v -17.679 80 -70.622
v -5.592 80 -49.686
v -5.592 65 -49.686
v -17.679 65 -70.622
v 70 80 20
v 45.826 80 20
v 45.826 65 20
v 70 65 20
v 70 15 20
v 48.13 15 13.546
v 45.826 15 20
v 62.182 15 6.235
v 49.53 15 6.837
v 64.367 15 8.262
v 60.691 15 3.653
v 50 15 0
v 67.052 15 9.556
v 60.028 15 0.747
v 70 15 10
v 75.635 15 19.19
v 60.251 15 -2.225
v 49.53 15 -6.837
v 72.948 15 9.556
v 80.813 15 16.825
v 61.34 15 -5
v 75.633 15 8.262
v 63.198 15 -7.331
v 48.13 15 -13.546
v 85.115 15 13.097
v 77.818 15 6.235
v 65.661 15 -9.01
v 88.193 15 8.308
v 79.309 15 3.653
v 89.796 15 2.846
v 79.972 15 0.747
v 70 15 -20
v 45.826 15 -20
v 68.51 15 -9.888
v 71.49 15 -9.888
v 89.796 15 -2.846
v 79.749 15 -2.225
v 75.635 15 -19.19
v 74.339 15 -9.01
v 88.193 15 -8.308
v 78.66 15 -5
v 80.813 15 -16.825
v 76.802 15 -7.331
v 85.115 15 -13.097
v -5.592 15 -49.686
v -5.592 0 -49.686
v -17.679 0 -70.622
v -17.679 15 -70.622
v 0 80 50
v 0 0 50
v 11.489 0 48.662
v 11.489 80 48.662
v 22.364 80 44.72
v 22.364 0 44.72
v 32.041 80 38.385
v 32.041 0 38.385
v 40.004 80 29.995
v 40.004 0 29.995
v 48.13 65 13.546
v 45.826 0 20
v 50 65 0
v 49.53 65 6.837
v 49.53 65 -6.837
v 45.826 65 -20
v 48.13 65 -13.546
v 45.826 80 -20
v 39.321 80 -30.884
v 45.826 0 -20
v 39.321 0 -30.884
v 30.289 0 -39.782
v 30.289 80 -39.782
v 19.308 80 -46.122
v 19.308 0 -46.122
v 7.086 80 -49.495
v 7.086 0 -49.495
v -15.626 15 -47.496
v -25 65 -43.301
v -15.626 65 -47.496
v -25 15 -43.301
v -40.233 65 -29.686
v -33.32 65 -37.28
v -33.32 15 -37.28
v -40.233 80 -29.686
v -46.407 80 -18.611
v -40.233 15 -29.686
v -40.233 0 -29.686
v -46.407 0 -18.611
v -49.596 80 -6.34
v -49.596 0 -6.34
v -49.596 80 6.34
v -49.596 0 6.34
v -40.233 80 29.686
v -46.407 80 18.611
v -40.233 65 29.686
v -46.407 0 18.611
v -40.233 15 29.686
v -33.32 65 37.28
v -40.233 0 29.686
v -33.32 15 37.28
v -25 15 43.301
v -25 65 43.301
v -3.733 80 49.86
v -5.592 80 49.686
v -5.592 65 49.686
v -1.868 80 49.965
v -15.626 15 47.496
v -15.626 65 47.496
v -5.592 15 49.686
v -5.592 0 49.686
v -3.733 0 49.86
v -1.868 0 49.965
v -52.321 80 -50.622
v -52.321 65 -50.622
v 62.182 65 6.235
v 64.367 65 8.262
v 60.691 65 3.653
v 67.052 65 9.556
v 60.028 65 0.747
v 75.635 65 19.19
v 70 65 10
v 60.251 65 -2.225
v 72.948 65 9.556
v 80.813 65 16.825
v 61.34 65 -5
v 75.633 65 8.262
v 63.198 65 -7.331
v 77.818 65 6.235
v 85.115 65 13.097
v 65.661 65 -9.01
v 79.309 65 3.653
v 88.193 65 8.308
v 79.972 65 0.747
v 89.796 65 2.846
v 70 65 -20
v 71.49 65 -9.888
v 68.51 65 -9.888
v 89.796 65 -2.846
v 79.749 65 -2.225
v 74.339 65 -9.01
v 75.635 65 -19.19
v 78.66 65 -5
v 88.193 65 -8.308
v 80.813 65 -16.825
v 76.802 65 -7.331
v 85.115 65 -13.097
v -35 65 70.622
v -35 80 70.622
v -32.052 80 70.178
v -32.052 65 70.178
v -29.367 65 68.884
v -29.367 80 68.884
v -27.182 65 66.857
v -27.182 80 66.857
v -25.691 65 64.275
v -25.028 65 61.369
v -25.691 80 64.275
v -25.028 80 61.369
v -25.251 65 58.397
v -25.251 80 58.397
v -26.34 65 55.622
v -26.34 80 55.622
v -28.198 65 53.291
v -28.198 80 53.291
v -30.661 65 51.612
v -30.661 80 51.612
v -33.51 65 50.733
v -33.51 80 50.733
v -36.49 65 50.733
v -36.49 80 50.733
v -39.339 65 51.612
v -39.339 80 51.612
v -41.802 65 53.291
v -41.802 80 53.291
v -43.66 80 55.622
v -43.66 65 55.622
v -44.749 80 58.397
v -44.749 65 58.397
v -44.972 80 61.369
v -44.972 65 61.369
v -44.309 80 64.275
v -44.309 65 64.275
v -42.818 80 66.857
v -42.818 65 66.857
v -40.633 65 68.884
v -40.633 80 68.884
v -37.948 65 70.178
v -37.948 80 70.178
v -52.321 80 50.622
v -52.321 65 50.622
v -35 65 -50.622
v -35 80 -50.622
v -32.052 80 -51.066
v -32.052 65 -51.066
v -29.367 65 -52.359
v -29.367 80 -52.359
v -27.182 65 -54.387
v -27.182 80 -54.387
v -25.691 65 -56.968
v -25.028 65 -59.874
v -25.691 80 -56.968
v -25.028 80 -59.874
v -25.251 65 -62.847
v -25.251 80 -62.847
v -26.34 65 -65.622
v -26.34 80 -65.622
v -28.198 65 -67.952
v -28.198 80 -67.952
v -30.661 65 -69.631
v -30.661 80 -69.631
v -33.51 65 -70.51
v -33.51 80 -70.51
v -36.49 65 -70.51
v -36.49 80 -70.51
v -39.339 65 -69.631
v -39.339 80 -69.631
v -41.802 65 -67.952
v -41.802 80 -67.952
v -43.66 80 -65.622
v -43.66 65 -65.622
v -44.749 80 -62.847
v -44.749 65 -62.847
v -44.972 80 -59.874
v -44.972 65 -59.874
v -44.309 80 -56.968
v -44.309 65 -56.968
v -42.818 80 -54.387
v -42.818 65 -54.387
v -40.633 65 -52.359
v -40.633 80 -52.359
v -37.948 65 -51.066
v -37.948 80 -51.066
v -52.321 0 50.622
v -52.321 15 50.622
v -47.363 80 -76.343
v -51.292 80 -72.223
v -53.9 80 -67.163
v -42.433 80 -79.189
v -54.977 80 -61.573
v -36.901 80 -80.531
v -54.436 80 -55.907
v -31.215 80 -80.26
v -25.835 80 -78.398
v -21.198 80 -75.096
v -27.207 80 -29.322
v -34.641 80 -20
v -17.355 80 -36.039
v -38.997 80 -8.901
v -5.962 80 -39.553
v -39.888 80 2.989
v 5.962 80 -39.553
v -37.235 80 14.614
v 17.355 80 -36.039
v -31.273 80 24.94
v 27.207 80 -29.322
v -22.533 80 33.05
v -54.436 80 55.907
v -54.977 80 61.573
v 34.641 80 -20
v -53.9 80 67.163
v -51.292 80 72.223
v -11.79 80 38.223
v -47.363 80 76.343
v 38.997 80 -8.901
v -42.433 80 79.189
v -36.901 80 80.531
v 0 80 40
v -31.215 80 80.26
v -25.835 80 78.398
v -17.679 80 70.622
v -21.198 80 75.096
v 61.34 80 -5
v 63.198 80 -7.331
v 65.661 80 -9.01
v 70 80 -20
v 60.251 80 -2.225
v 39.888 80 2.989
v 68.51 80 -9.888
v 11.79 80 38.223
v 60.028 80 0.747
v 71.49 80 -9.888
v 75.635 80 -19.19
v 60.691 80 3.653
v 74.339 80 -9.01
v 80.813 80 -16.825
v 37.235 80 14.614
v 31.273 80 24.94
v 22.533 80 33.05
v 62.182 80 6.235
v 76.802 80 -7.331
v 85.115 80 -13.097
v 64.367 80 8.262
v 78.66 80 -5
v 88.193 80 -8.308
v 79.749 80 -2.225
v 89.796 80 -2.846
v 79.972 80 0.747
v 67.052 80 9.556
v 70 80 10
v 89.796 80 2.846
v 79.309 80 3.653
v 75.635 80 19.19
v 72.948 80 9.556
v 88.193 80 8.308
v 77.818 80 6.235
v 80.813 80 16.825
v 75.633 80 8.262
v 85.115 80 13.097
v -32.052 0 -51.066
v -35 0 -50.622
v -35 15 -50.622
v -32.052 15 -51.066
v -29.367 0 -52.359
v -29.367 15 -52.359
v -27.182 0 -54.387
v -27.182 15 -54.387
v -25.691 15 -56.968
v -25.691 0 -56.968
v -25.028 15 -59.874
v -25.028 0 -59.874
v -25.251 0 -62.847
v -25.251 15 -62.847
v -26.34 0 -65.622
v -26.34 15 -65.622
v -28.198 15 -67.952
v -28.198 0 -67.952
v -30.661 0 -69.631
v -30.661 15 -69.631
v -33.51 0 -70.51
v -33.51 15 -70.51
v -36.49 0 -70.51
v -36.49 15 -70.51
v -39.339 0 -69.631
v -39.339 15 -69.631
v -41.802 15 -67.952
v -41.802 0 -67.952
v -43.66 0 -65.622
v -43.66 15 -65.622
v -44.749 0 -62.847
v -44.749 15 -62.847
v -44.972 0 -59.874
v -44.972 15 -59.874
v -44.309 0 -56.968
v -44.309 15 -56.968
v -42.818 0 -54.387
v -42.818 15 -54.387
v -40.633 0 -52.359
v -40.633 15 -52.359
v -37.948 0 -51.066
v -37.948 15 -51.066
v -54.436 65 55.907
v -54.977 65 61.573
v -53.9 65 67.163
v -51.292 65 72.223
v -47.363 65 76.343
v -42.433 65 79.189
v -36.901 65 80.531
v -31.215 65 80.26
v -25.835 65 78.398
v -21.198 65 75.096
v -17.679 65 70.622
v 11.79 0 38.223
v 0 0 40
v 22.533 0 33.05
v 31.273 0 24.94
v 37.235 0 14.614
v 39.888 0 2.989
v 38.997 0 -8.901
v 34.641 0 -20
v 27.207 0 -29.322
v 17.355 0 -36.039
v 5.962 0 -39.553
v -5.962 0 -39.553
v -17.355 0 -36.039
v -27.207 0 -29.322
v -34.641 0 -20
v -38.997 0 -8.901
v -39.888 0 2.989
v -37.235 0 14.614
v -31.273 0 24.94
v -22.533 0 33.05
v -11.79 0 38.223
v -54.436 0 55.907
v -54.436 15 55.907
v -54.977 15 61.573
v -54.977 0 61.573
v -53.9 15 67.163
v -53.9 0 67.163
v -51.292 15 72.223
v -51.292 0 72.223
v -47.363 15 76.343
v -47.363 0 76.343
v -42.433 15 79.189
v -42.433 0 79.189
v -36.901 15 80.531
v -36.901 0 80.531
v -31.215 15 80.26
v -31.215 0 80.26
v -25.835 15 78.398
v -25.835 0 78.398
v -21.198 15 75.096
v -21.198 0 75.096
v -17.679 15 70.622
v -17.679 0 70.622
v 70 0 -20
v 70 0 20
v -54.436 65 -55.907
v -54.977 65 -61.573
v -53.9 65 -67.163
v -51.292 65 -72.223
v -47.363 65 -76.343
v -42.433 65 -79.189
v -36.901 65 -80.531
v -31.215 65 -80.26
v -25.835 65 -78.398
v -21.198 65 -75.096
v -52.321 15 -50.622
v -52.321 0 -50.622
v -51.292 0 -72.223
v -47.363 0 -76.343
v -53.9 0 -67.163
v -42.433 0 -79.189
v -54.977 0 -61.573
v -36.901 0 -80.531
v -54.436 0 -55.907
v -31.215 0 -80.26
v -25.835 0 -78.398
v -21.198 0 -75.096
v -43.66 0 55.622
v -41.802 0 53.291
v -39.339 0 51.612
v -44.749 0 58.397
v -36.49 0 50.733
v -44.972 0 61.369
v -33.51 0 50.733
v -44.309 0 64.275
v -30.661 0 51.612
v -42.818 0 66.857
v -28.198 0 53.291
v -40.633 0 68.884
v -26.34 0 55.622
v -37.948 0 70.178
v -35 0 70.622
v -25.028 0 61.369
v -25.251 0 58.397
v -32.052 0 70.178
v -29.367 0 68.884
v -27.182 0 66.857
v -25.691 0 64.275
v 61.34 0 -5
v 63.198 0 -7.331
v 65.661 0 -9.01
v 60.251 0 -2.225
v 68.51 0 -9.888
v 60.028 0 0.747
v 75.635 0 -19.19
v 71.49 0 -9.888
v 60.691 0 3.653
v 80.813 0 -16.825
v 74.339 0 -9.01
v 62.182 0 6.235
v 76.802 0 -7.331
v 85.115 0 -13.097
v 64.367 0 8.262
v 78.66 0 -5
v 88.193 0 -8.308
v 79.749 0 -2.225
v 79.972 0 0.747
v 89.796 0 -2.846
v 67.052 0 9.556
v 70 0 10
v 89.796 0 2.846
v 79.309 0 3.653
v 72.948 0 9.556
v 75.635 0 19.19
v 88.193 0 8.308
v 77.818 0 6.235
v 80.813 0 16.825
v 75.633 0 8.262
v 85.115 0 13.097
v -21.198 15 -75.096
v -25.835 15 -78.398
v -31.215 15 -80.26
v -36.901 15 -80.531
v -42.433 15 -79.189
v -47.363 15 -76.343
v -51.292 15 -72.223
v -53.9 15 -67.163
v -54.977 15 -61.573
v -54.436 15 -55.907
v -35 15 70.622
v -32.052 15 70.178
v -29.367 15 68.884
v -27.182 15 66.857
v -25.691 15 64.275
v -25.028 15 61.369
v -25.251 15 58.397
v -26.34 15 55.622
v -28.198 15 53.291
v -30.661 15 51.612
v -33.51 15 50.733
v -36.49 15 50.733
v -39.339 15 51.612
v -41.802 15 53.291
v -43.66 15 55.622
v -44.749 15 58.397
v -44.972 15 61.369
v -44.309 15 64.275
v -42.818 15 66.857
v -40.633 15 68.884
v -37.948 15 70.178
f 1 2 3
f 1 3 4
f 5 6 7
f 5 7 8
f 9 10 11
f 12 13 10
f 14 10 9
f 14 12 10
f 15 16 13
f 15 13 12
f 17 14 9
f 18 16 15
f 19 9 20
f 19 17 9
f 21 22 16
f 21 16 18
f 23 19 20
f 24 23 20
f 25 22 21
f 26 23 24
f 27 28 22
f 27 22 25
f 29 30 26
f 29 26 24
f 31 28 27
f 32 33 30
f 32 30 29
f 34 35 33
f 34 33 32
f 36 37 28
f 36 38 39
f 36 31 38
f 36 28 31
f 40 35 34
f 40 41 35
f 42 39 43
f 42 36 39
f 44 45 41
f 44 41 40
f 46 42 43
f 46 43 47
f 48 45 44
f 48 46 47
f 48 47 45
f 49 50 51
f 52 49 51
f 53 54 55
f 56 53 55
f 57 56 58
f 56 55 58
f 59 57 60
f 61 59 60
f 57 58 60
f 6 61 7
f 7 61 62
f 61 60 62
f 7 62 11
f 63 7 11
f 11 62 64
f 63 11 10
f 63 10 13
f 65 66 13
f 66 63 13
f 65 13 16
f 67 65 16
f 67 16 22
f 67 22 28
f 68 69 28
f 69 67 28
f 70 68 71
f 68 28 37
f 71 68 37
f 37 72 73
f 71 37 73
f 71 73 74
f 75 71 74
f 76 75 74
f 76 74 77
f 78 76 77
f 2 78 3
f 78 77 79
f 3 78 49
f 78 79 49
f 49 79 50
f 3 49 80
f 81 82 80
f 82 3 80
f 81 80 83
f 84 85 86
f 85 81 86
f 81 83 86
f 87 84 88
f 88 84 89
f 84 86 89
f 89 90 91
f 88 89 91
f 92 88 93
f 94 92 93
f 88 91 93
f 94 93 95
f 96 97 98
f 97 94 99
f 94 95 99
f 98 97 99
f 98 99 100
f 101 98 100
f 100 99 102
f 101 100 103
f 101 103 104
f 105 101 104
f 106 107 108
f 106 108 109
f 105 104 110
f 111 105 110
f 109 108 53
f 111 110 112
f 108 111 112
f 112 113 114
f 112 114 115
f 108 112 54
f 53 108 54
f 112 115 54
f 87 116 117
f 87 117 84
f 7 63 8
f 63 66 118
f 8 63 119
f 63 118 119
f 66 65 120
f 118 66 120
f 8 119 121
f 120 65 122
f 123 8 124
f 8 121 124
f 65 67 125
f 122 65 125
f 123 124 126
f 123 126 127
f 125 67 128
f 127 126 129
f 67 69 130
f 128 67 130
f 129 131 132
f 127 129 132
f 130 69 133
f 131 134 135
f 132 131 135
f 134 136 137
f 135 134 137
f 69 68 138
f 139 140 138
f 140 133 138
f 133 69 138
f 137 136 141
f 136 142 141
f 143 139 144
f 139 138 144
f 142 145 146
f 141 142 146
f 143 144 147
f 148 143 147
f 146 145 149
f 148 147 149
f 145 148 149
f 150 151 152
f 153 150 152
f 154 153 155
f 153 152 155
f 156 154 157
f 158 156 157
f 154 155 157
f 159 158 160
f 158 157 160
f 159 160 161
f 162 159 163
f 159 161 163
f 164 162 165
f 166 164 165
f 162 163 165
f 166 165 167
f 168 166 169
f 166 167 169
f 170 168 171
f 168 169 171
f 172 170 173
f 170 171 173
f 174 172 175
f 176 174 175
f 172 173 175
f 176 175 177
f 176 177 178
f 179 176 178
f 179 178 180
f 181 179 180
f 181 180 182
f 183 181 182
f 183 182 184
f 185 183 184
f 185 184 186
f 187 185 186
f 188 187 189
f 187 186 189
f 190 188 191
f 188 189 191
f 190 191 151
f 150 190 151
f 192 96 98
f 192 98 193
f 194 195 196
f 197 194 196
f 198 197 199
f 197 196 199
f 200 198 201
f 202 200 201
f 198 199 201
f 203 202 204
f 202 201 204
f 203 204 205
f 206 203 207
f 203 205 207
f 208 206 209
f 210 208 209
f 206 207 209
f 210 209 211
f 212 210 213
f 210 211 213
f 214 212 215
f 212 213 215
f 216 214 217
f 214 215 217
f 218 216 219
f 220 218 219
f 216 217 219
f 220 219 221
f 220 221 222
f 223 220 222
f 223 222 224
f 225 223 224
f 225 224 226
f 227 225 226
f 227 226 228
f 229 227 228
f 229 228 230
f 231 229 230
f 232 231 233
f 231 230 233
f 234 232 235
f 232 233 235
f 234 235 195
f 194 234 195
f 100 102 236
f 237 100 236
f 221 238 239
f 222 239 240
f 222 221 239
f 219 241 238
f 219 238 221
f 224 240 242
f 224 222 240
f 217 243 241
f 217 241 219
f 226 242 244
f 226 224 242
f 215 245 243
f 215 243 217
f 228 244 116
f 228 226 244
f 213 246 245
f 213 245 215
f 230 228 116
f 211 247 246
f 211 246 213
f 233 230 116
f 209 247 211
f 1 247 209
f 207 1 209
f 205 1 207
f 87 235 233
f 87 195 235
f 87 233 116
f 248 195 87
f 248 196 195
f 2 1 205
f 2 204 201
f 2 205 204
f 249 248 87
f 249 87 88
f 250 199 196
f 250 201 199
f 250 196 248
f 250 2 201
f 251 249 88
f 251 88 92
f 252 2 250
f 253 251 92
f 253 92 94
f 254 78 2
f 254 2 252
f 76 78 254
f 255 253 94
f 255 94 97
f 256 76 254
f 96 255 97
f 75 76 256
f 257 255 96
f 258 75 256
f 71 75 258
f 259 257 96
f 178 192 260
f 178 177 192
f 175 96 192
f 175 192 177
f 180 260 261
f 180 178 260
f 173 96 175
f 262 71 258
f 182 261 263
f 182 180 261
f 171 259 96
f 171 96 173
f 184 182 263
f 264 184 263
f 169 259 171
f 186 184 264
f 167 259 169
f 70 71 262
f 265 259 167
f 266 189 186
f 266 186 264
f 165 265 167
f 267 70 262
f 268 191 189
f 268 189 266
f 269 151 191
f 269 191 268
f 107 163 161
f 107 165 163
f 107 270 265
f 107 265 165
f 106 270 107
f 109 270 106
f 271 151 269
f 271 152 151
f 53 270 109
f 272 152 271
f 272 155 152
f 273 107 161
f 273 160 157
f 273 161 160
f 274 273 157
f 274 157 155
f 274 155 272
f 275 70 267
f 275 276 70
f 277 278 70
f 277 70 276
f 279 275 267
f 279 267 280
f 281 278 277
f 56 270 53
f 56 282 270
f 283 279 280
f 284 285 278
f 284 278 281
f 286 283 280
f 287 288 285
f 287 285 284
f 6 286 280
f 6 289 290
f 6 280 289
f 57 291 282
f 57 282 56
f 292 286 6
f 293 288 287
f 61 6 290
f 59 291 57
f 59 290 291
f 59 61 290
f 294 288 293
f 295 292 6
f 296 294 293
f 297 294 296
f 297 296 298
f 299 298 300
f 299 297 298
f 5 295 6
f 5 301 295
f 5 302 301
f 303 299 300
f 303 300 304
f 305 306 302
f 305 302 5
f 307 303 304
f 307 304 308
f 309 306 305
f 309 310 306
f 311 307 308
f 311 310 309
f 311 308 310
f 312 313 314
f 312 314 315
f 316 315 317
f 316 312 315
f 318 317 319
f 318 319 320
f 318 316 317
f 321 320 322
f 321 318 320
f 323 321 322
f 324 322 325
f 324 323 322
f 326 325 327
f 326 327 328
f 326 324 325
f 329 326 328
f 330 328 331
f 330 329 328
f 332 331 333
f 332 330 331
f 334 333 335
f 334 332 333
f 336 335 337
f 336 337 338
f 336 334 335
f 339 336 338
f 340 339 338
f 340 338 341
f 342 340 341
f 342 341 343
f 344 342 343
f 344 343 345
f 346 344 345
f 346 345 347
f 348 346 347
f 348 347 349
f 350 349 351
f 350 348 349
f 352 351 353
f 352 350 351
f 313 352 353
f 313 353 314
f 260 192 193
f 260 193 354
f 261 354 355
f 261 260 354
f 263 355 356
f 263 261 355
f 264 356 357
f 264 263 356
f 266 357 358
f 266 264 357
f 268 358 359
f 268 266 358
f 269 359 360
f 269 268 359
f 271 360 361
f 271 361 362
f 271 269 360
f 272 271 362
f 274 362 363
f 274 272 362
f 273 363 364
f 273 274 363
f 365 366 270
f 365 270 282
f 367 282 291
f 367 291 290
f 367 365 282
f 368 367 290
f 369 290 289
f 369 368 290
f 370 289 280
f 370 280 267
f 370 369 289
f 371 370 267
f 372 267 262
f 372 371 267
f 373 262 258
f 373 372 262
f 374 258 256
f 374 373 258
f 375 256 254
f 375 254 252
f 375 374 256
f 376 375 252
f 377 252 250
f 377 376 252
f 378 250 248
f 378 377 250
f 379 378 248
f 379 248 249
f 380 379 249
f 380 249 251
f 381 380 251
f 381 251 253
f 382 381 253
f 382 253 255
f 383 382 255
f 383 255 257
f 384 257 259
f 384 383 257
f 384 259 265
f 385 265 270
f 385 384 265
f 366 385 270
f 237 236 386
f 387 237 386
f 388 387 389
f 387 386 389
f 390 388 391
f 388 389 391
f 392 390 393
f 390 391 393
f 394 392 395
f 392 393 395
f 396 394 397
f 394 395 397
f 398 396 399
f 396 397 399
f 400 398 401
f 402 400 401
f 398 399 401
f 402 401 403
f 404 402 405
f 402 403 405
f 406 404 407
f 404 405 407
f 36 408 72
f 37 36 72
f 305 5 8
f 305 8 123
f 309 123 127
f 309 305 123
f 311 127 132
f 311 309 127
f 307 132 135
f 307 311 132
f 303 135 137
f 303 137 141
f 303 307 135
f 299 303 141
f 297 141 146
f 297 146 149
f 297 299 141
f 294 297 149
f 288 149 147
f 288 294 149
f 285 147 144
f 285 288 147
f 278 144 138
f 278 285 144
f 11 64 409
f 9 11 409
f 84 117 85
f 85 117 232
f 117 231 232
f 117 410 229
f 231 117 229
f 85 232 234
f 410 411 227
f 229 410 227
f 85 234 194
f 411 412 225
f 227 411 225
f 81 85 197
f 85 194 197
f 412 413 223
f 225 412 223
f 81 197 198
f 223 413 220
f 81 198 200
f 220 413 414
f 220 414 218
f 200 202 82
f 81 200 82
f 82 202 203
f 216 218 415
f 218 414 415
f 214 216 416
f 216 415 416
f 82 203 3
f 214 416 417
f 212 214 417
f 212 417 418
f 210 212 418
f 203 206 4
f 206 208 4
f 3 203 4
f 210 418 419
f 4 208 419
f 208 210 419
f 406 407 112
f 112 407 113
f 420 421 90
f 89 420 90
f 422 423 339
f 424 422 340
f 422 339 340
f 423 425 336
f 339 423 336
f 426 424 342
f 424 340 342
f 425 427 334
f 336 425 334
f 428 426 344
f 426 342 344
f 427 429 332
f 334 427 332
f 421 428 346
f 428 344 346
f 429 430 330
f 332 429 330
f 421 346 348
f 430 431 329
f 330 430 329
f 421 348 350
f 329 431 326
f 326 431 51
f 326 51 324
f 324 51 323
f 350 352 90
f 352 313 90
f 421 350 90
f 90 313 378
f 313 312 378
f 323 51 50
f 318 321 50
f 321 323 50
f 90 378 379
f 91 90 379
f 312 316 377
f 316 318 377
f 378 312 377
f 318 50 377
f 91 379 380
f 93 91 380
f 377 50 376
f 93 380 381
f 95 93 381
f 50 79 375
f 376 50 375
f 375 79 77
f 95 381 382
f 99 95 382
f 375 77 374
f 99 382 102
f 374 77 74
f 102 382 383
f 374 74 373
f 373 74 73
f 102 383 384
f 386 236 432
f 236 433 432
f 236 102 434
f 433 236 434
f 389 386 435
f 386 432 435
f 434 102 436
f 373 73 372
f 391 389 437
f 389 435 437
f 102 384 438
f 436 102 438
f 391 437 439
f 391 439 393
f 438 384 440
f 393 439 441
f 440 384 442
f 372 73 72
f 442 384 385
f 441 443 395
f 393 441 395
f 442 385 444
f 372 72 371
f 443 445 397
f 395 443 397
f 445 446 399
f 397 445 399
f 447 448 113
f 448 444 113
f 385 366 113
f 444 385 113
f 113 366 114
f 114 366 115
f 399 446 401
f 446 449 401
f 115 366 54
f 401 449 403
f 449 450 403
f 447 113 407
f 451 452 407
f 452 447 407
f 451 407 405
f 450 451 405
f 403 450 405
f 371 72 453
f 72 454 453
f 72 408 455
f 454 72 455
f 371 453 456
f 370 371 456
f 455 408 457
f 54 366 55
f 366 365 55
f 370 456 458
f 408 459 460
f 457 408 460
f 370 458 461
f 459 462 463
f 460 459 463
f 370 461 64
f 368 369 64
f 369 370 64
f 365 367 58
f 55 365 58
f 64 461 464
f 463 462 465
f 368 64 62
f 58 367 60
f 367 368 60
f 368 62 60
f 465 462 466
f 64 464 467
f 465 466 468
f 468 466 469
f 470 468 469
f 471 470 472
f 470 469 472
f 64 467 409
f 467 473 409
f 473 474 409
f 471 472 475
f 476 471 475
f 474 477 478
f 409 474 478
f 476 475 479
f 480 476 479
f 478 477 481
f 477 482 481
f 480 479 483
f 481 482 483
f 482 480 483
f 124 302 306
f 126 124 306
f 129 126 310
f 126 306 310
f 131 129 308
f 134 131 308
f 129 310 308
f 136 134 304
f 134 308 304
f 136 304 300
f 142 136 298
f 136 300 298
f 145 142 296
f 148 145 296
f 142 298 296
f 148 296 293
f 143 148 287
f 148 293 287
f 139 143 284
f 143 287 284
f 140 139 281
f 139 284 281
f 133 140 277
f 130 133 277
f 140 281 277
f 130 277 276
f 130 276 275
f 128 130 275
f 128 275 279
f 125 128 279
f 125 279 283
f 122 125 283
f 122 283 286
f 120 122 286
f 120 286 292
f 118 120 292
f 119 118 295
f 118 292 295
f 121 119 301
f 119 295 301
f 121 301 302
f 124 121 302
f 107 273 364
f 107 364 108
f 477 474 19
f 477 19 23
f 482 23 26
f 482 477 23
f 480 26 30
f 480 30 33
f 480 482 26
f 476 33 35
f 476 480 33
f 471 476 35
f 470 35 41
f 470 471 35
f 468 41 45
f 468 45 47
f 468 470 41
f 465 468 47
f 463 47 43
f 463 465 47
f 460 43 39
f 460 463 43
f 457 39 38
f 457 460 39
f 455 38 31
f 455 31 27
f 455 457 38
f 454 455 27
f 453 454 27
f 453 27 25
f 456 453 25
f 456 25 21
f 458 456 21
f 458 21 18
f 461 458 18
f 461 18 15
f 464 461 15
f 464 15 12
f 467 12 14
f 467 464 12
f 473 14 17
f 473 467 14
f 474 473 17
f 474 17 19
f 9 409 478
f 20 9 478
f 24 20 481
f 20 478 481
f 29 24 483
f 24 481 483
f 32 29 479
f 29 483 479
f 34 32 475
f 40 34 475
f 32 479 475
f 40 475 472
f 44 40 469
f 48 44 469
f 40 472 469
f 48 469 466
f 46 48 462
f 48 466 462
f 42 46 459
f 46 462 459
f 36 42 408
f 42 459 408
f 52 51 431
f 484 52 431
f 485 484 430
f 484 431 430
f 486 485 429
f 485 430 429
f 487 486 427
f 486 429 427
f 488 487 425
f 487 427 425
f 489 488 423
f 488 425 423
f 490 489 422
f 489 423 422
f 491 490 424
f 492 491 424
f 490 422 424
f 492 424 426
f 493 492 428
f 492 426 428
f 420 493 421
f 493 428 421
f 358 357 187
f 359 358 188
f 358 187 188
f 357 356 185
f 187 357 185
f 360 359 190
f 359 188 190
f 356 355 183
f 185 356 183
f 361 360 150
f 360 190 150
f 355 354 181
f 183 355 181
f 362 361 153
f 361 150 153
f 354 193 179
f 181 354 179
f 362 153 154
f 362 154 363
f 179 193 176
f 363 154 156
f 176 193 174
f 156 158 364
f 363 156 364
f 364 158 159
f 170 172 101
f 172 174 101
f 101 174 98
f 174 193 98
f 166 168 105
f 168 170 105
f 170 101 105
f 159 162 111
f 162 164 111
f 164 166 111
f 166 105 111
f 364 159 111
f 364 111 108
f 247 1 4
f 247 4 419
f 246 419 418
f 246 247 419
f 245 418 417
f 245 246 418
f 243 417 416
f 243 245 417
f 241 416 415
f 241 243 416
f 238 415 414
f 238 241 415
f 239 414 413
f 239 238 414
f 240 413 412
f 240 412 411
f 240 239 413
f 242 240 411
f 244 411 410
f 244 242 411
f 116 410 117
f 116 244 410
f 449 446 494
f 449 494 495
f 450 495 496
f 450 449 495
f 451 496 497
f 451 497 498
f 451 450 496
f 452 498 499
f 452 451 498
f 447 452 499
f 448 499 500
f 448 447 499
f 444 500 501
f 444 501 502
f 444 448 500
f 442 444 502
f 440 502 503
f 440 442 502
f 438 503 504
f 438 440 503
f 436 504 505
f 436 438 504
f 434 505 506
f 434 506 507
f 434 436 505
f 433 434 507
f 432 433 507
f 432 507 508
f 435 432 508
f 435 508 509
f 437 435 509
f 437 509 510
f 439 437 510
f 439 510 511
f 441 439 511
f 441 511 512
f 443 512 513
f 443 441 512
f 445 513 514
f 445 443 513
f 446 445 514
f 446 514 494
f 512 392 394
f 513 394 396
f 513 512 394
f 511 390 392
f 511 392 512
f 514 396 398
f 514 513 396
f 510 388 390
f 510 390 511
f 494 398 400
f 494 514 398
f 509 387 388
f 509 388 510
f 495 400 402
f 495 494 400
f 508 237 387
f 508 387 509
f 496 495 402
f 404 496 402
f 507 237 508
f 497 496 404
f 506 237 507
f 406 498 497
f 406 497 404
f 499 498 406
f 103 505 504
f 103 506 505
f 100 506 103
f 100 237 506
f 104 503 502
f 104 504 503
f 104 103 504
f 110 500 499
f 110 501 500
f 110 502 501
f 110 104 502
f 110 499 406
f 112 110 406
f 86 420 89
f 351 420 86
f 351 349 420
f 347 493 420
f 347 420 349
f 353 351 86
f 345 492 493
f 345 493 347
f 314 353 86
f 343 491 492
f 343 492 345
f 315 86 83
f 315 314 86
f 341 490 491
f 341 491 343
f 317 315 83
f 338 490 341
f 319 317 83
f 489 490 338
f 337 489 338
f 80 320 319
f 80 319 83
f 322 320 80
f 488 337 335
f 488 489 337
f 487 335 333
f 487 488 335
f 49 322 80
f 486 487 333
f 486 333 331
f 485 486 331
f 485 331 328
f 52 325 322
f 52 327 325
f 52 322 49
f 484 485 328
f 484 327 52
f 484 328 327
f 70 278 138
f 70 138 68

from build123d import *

# Parameters (mm, degrees)
SKETCH1_R           = 40
BOSS_EXTRUDE2_DEPTH = 80
SKETCH1_4_R         = 10
BOSS_EXTRUDE4_DEPTH = 15


with BuildPart() as part:
    # Sketch1 → Boss-Extrude2 (new body)
    with BuildSketch(Plane(origin=(0, 0, 0), x_dir=(1, 0, 0), z_dir=(0, 1, 0))):
        with BuildLine():
            ThreePointArc((50, 0), (48.945315647, 10.215482184), (45.82575695, 20))
            ThreePointArc((45.82575695, 20), (25, 43.301270189), (-5.592370399, 49.686269666))
            ThreePointArc((-5.592370399, 49.686269666), (-25, 43.301270189), (-40.23338655, 29.686269666))
            ThreePointArc((-40.23338655, 29.686269666), (-50, 0), (-40.23338655, -29.686269666))
            ThreePointArc((-40.23338655, -29.686269666), (-25, -43.301270189), (-5.592370399, -49.686269666))
            ThreePointArc((-5.592370399, -49.686269666), (25, -43.301270189), (45.82575695, -20))
            ThreePointArc((45.82575695, -20), (48.945315647, -10.215482184), (50, 0))
        make_face()
        Circle(SKETCH1_R, mode=Mode.SUBTRACT)
    extrude(amount=BOSS_EXTRUDE2_DEPTH)

    # Sketch1<4> → Boss-Extrude4 (add)
    # profile 1 of 3: a face of its own
    with BuildSketch(Plane(origin=(0, 0, 0), x_dir=(1, 0, 0), z_dir=(0, 1, 0))):
        with BuildLine():
            ThreePointArc((70, -20), (90, 0), (70, 20))
            Line((70, 20), (45.82575695, 20))
            ThreePointArc((45.82575695, 20), (50, 0), (45.82575695, -20))
            Line((45.82575695, -20), (70, -20))
        make_face()
        with Locations((70, 0)):
            Circle(SKETCH1_4_R, mode=Mode.SUBTRACT)
    # profile 2 of 3: a face of its own
    with BuildSketch(Plane(origin=(0, 0, 0), x_dir=(1, 0, 0), z_dir=(0, 1, 0))):
        with BuildLine():
            ThreePointArc((-40.23338655, 29.686269666), (-25, 43.301270189), (-5.592370399, 49.686269666))
            Line((-5.592370399, 49.686269666), (-17.679491924, 70.621778265))
            ThreePointArc((-17.679491924, 70.621778265), (-45, 77.942286341), (-52.320508076, 50.621778265))
            Line((-52.320508076, 50.621778265), (-40.23338655, 29.686269666))
        make_face()
        with Locations((-35, 60.621778265)):
            Circle(SKETCH1_4_R, mode=Mode.SUBTRACT)
    # profile 3 of 3: a face of its own
    with BuildSketch(Plane(origin=(0, 0, 0), x_dir=(1, 0, 0), z_dir=(0, 1, 0))):
        with BuildLine():
            Line((-17.679491924, -70.621778265), (-5.592370399, -49.686269666))
            ThreePointArc((-5.592370399, -49.686269666), (-25, -43.301270189), (-40.23338655, -29.686269666))
            Line((-40.23338655, -29.686269666), (-52.320508076, -50.621778265))
            ThreePointArc((-52.320508076, -50.621778265), (-45, -77.942286341), (-17.679491924, -70.621778265))
        make_face()
        with Locations((-35, -60.621778265)):
            Circle(SKETCH1_4_R, mode=Mode.SUBTRACT)
    boss_extrude4 = extrude(amount=BOSS_EXTRUDE4_DEPTH)

    # Mirror1: Boss-Extrude4 across plane
    add(boss_extrude4.mirror(Plane.ZX.offset(40)))


solid = part.part
